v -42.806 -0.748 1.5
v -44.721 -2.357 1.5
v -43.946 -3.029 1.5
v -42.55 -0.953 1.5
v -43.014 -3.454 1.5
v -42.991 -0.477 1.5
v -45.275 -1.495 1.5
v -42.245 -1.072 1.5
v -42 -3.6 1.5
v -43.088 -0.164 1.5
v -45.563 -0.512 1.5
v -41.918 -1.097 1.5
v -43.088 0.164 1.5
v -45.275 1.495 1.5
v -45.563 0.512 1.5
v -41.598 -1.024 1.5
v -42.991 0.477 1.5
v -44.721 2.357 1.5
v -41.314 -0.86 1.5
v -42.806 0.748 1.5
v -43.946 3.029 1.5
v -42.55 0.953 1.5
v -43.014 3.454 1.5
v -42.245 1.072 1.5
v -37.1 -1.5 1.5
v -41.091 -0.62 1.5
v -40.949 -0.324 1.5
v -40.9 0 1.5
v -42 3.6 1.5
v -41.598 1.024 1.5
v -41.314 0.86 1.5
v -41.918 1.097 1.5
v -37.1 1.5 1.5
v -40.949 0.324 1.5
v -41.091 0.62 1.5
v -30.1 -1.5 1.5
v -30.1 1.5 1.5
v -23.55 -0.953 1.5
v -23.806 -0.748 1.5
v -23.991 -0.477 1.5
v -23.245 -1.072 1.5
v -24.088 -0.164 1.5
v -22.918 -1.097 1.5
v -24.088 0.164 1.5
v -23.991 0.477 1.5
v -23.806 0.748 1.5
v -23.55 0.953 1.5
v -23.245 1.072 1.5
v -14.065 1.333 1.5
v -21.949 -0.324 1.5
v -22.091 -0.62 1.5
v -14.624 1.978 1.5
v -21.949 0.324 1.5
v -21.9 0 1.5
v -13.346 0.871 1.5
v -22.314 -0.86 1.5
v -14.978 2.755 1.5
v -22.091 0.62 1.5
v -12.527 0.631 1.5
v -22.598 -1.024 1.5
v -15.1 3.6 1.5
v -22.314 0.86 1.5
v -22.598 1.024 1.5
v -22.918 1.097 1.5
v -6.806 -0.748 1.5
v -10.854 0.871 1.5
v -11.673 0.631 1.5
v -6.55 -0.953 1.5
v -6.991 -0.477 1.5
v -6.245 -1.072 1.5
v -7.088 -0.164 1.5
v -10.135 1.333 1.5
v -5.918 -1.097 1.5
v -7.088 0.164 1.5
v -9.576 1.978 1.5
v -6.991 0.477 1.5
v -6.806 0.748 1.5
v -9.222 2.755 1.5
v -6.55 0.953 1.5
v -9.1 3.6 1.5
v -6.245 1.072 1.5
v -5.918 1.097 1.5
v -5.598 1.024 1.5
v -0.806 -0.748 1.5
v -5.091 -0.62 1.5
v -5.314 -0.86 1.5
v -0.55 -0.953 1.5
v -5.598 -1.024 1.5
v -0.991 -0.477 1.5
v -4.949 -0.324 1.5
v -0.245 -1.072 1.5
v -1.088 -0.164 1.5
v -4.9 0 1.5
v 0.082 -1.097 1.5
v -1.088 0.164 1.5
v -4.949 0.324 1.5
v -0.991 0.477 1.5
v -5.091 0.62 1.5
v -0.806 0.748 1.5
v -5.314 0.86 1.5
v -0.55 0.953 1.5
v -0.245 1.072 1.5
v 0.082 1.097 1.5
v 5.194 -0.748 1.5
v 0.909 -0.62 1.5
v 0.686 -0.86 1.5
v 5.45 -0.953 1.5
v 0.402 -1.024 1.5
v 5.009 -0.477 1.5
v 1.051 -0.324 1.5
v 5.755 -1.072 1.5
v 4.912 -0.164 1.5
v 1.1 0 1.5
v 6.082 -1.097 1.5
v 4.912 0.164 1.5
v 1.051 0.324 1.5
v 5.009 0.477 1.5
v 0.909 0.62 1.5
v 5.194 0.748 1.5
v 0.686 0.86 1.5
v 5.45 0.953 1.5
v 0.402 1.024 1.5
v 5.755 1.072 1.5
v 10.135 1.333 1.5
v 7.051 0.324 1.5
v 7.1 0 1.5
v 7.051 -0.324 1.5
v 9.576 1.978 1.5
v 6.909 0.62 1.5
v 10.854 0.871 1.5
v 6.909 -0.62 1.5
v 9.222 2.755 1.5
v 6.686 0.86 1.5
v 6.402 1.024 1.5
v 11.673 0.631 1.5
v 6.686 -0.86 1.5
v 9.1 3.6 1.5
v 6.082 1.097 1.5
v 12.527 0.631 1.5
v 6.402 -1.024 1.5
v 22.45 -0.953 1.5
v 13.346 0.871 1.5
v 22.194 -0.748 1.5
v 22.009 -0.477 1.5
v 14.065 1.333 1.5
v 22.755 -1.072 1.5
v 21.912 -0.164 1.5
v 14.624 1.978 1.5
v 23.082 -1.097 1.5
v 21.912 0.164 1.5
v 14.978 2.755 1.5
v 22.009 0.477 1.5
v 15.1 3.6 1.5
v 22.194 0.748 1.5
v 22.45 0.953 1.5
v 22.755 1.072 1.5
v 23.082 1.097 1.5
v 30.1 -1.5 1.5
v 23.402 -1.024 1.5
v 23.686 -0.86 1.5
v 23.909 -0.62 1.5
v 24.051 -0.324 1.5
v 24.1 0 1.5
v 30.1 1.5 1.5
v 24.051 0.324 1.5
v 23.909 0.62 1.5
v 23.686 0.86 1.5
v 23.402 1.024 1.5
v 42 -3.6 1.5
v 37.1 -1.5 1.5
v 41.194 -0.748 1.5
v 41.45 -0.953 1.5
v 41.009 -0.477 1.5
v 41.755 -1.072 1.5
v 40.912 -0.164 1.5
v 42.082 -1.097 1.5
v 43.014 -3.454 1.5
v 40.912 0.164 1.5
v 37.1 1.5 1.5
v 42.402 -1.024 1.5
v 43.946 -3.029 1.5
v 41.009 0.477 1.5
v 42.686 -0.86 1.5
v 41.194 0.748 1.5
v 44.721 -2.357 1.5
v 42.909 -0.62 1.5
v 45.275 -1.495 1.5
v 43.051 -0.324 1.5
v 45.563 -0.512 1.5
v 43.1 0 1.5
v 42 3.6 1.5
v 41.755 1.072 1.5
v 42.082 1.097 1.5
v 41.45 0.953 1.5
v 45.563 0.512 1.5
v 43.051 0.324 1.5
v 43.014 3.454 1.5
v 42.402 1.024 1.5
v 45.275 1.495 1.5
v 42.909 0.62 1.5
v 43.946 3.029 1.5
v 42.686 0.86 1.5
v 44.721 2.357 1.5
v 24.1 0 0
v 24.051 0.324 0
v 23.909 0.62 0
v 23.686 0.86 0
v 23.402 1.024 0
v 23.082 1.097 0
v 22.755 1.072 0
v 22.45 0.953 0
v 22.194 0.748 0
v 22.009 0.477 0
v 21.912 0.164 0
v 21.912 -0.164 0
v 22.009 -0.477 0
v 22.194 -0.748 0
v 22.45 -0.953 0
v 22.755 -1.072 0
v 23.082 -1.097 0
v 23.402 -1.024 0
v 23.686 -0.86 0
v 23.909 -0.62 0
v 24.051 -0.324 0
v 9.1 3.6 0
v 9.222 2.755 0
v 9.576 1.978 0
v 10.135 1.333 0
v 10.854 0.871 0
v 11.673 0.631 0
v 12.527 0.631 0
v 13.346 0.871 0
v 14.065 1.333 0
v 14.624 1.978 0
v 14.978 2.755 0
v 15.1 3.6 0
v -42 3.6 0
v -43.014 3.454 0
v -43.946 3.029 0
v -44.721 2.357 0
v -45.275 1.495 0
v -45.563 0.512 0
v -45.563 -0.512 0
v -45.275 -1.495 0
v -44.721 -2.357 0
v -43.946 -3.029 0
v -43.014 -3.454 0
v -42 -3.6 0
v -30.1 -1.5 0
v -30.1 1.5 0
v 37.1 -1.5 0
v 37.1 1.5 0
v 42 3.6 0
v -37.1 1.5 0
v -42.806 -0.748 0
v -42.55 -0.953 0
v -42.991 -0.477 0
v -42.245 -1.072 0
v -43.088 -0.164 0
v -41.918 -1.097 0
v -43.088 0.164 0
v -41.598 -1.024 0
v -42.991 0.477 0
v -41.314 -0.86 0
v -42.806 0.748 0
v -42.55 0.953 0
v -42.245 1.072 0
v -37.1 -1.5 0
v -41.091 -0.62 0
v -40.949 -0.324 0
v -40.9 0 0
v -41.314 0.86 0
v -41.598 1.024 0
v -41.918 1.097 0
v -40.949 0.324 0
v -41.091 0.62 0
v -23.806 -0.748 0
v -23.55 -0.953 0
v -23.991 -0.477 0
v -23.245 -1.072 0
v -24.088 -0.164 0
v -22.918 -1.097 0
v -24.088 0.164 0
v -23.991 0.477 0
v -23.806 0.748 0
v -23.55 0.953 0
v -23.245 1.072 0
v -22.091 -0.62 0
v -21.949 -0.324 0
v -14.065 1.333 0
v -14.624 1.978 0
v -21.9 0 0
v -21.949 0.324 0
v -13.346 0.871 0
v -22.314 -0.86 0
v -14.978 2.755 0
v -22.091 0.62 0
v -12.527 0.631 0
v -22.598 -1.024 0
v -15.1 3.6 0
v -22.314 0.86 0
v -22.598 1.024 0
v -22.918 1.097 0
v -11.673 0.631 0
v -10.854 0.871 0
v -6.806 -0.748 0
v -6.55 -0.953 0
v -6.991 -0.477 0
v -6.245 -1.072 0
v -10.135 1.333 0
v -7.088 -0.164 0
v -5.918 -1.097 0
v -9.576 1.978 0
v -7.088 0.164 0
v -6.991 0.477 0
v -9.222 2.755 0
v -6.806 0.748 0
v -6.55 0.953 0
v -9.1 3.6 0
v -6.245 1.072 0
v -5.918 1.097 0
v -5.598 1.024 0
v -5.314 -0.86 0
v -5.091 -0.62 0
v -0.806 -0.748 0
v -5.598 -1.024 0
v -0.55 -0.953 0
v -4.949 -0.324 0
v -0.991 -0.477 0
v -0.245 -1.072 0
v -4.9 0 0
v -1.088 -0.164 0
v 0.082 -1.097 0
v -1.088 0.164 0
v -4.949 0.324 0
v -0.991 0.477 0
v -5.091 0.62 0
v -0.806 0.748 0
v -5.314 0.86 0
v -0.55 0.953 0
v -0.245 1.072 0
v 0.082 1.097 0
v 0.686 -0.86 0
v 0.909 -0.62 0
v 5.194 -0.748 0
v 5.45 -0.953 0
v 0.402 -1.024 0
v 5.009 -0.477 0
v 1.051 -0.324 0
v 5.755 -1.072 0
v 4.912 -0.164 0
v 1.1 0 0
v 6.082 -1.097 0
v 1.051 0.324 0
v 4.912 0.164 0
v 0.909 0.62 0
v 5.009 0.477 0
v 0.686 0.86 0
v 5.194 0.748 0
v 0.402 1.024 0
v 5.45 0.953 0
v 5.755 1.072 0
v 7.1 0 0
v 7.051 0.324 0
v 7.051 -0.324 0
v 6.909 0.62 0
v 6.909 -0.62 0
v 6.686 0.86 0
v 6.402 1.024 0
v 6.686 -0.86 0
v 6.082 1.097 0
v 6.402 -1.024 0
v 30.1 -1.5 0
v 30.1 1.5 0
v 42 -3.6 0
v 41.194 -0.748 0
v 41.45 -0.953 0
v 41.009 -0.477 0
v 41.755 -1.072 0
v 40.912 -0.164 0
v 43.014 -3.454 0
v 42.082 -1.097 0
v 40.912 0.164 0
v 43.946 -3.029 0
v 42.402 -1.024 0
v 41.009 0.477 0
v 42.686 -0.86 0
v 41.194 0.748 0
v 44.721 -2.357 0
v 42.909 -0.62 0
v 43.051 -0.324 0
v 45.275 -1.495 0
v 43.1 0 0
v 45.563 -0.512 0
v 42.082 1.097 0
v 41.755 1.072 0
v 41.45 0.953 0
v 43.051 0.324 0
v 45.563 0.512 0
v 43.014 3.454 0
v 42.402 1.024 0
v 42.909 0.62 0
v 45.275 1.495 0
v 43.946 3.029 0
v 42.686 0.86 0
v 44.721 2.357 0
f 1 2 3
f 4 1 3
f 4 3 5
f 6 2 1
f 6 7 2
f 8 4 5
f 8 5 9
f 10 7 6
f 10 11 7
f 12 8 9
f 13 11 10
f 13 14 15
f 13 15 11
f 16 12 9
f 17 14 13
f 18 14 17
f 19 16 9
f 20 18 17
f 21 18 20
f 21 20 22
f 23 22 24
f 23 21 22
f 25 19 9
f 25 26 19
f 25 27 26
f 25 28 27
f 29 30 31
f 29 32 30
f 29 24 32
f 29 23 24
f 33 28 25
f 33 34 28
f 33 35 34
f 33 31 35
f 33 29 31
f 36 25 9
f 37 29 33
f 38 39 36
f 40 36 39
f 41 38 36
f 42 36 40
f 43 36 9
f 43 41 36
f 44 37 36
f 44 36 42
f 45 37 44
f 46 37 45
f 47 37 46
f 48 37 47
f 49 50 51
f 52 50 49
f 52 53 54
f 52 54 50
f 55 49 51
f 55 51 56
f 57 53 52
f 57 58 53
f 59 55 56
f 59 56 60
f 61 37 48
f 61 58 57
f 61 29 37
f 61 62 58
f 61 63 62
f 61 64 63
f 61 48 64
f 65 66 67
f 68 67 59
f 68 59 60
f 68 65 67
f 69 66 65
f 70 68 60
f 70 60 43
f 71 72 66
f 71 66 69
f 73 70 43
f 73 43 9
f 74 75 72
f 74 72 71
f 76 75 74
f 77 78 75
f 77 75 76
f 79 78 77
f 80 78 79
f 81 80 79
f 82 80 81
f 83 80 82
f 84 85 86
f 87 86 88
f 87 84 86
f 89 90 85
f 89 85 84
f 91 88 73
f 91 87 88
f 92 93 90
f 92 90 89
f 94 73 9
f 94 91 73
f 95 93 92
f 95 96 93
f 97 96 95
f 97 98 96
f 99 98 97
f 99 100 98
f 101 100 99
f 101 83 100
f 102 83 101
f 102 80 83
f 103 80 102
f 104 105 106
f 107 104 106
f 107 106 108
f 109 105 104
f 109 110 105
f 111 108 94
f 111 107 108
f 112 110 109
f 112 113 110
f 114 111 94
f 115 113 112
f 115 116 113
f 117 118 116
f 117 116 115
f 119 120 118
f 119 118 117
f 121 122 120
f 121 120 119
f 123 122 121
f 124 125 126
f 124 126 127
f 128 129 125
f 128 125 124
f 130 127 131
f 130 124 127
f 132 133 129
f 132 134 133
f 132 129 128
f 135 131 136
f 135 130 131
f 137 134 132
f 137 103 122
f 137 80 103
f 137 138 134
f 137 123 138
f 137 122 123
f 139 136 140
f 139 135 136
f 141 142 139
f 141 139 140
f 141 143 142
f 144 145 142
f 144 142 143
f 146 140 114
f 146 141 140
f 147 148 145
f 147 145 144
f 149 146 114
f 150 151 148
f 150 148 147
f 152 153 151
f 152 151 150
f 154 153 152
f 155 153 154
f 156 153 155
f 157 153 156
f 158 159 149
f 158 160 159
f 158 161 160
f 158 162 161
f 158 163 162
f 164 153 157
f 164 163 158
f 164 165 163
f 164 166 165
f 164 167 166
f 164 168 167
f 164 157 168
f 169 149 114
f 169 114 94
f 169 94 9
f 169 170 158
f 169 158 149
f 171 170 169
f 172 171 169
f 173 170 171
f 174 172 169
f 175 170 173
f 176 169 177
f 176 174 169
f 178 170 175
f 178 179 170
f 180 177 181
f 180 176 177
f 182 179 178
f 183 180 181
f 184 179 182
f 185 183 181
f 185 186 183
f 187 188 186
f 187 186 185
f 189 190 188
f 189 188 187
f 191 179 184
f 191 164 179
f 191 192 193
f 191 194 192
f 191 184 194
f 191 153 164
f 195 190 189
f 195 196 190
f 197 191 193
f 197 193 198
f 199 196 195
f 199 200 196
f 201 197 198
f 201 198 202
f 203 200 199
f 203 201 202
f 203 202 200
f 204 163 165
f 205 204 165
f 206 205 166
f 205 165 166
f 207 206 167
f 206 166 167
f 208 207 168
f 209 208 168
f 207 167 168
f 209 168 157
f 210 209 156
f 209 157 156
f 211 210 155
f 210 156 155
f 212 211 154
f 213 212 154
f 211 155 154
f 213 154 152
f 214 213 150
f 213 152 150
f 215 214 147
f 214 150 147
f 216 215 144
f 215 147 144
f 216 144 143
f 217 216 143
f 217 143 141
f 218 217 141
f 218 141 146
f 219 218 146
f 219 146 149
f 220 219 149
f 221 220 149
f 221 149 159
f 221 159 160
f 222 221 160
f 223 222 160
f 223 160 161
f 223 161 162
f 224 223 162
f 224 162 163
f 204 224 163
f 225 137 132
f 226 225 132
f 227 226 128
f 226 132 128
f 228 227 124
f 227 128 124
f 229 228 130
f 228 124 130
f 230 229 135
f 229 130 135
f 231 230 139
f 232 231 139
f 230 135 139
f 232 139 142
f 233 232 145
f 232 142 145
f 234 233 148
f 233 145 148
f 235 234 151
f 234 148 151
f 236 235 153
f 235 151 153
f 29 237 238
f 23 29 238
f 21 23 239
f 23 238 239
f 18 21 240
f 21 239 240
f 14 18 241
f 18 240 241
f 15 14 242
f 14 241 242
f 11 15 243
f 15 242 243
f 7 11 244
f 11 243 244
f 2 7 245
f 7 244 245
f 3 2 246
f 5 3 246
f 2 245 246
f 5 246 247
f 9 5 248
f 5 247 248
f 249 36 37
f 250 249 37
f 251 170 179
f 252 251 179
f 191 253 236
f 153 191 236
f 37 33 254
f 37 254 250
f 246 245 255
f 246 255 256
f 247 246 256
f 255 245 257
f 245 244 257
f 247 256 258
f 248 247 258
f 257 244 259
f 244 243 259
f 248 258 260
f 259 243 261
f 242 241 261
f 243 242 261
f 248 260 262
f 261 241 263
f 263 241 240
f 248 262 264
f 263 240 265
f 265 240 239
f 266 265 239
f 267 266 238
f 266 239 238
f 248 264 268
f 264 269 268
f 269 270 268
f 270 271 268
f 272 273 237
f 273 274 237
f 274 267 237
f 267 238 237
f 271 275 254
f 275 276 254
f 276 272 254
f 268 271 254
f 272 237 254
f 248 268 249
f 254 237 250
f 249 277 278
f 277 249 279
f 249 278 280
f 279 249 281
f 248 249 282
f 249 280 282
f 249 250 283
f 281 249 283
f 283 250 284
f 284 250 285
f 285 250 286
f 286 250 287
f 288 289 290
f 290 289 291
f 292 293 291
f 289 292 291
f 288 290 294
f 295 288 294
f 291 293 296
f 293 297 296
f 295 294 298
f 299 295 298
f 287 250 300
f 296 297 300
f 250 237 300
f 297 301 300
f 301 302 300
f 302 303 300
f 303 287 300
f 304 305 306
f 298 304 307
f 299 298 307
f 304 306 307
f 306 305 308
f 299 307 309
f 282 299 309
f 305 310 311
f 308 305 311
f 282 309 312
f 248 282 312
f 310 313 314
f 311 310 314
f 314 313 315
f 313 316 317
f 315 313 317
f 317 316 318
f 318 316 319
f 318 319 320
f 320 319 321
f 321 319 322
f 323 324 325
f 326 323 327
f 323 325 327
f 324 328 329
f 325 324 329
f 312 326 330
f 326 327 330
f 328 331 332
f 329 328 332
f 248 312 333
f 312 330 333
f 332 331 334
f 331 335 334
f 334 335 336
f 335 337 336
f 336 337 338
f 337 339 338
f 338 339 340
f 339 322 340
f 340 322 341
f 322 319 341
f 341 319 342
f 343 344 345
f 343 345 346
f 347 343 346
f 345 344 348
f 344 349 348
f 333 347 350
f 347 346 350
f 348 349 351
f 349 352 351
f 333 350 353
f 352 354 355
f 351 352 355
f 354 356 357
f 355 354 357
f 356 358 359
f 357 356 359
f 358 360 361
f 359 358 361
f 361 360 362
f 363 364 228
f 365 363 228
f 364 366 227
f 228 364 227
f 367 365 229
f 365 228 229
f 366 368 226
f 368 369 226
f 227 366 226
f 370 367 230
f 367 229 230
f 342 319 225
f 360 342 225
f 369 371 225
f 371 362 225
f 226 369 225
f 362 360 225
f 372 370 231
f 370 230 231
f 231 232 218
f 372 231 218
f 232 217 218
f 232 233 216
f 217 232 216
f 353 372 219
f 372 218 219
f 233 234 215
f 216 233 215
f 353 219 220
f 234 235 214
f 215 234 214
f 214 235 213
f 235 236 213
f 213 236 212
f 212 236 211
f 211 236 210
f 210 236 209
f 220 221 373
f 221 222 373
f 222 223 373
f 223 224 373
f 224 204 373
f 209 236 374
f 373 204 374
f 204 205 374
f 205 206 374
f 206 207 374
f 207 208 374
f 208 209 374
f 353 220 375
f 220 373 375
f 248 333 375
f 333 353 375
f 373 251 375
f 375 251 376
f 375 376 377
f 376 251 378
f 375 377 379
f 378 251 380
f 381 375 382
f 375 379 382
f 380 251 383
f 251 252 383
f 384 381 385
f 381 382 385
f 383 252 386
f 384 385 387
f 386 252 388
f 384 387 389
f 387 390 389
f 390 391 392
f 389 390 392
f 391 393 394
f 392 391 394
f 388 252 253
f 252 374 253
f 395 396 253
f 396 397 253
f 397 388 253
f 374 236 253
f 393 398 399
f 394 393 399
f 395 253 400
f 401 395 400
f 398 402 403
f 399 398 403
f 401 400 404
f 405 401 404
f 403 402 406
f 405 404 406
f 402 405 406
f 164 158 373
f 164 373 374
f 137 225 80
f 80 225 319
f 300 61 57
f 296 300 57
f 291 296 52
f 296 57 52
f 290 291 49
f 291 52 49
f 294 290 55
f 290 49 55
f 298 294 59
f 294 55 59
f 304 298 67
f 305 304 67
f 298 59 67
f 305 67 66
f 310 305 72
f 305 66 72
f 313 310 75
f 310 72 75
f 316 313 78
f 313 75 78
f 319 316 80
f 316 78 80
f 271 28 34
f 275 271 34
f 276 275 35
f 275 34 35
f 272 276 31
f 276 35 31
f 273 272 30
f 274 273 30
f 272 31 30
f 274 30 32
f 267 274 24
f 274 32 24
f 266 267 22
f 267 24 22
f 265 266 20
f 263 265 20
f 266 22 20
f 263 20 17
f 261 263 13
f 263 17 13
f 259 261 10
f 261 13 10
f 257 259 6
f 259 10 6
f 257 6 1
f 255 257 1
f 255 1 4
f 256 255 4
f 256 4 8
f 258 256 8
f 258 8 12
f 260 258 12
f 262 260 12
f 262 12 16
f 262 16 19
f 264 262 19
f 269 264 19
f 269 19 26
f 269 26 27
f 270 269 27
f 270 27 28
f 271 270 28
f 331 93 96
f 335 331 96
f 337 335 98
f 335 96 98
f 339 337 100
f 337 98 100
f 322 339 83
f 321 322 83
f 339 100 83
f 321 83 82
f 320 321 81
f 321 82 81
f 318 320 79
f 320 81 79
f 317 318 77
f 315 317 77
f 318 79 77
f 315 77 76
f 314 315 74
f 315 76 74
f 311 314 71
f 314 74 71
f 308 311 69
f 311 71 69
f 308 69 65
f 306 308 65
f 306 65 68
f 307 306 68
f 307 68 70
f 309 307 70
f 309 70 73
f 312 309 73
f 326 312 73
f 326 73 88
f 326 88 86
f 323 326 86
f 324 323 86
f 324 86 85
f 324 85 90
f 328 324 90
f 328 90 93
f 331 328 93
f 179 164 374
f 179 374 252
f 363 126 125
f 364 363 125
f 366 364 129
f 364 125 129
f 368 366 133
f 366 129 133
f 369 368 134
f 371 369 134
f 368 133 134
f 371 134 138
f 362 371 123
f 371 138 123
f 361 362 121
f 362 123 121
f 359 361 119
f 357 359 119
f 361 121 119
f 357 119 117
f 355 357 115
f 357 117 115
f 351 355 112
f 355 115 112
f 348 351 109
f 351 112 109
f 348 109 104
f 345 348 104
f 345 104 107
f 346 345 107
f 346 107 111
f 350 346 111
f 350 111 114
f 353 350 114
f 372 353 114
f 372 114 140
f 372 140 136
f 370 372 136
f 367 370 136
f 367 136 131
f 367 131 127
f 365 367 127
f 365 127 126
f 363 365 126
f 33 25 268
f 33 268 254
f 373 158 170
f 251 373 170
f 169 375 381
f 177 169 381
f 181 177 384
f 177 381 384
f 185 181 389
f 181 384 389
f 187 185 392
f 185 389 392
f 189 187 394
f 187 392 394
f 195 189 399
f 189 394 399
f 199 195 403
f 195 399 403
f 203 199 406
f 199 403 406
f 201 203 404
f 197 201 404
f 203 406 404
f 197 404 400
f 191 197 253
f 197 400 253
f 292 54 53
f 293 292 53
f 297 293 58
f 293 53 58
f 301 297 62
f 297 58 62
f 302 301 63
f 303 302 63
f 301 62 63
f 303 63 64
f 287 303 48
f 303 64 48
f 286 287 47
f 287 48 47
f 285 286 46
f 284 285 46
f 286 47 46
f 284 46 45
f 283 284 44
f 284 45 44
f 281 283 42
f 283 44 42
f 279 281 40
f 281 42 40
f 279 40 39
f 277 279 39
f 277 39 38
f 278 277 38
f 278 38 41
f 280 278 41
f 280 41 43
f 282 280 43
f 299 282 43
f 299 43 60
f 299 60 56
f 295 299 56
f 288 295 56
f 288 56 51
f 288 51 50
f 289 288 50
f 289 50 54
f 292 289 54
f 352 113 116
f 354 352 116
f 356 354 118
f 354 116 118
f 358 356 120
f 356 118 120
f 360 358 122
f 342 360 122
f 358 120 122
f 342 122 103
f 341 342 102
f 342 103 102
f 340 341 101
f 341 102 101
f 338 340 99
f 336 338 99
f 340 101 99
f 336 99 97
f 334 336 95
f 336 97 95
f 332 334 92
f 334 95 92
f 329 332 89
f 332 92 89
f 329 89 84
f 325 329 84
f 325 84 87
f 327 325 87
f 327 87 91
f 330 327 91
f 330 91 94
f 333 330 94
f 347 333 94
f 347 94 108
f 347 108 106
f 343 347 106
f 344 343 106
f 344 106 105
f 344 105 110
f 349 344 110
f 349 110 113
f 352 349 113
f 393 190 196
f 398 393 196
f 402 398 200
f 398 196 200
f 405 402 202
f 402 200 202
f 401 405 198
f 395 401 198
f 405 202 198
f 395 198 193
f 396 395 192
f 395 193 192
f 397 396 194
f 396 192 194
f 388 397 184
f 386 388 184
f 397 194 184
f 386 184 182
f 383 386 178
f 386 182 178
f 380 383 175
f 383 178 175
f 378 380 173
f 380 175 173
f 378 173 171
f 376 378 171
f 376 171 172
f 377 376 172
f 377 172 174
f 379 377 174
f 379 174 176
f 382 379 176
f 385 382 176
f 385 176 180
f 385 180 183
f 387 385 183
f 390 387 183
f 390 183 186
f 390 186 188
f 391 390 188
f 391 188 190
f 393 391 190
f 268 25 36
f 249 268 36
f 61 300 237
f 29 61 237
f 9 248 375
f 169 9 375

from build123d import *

# Parameters (mm, degrees)
F1_DEPTH = 1.5
F2_R     = 1.1
F3_DEPTH = 1.501
F4_W     = 7
F4_H     = 3
F4_R     = 3
F5_DEPTH = 1.501


with BuildPart() as f1:
    # F0 (on Top) → F1 (new body)
    with BuildSketch(Plane.XY):
        with BuildLine():
            Line((42, 3.6), (-42, 3.6))
            ThreePointArc((-42, 3.6), (-45.6, 0), (-42, -3.6))
            Line((-42, -3.6), (42, -3.6))
            ThreePointArc((42, -3.6), (45.6, 0), (42, 3.6))
        make_face()
    extrude(amount=F1_DEPTH)

    # F2 (on face) → F3 (cut, through all)
    with BuildSketch(Plane.XY.offset(1.5)):
        with Locations((-42, 0)):
            Circle(F2_R)
        with Locations((42, 0)):
            Circle(F2_R)
        Circle(F2_R)
        with Locations((-36, 0)):
            Circle(F2_R)
        with Locations((36, 0)):
            Circle(F2_R)
        with Locations((-23, 0)):
            Circle(F2_R)
        with Locations((23, 0)):
            Circle(F2_R)
        with Locations((-6, 0)):
            Circle(F2_R)
        with Locations((6, 0)):
            Circle(F2_R)
    extrude(amount=-F3_DEPTH, mode=Mode.SUBTRACT)

    # F4 (on face) → F5 (cut, through all)
    with BuildSketch(Plane.XY.offset(1.5)):
        with Locations((-33.6, 0)):
            Rectangle(F4_W, F4_H)
        with Locations((-12.1, 3.6)):
            Circle(F4_R)
        with Locations((33.6, 0)):
            Rectangle(F4_W, F4_H)
        with Locations((12.1, 3.6)):
            Circle(F4_R)
    extrude(amount=-F5_DEPTH, mode=Mode.SUBTRACT)


solid = f1.part
